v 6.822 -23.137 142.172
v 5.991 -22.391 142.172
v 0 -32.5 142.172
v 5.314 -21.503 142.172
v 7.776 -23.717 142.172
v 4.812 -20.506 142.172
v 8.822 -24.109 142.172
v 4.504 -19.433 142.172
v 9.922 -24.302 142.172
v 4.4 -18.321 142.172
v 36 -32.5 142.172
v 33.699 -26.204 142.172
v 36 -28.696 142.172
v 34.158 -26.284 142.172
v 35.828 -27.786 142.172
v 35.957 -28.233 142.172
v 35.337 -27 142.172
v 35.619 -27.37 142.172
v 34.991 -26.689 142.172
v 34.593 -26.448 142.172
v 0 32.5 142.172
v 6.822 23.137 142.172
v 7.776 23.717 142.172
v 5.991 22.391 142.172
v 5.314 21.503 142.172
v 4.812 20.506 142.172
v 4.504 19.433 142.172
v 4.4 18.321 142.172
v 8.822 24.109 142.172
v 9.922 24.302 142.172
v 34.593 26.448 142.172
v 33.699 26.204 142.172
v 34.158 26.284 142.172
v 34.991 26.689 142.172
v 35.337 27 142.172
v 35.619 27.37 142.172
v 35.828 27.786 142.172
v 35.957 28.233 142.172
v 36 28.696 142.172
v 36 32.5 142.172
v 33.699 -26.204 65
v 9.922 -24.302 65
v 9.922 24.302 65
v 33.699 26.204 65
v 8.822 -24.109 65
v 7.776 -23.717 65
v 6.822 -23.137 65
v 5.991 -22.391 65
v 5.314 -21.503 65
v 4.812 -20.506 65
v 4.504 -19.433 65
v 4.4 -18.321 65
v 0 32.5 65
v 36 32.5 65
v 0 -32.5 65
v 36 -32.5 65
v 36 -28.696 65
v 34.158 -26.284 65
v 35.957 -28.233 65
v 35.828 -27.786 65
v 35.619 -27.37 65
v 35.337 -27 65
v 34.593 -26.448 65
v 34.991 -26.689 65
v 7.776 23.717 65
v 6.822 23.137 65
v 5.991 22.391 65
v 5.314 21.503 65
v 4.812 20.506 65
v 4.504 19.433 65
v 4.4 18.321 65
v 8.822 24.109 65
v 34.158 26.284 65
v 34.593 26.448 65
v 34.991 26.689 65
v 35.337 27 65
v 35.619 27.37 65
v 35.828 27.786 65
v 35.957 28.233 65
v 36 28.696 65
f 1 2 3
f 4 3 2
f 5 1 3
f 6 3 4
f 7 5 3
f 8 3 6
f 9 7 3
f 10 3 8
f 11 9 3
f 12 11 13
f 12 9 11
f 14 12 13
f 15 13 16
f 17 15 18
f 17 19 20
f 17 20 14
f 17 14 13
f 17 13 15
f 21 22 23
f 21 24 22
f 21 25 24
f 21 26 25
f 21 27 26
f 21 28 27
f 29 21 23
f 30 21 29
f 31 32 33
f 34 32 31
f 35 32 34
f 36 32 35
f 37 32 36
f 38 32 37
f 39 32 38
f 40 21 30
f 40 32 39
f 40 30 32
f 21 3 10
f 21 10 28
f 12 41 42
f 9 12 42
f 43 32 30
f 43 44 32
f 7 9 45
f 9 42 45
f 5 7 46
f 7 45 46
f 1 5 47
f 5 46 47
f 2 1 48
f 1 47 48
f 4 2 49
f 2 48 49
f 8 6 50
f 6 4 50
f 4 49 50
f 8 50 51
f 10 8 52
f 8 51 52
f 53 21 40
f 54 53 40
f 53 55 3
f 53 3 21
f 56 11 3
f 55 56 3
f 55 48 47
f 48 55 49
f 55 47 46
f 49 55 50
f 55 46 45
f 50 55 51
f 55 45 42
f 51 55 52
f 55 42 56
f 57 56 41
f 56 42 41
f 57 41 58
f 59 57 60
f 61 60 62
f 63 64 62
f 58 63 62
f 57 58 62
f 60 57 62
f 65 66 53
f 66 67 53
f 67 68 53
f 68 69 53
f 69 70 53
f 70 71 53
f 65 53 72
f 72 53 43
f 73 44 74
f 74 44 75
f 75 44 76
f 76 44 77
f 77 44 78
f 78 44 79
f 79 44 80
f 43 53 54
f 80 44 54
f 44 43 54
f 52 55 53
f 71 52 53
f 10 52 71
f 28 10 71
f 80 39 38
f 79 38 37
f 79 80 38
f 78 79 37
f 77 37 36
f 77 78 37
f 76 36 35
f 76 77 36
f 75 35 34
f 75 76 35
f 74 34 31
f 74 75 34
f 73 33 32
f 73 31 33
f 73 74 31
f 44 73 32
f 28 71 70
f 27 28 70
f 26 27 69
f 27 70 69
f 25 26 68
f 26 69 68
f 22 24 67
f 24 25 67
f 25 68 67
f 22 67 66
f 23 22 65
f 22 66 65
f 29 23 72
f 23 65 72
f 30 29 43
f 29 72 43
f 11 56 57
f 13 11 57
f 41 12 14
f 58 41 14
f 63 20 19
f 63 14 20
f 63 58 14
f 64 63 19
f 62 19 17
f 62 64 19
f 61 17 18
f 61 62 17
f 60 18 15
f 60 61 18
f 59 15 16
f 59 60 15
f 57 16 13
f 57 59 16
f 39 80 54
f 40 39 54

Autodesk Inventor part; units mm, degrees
ref_plane "Начальная плоскость" through (0, 0, 65) normal (0, 0, 1) x (1, 0, 0)
ref_plane "Конечная плоскость" through (0, 0, 142.172) normal (0, 0, 1) x (1, 0, 0)
sketch "Эскиз" plane through (0, 0, 0) normal (0, 0, 1) x (1, 0, 0)
  line L0 (36, -32.5) -> (0, -32.5)
  line L1 (36, -32.5) -> (36, -28.696)
  line L2 (33.6994, -26.2039) -> (9.9215, -24.3017)
  line L3 (4.4, -18.3208) -> (4.4, 18.3208)
  line L4 (33.6994, 26.2039) -> (9.9215, 24.3017)
  line L5 (36, 28.696) -> (36, 32.5)
  line L6 (0, 32.5) -> (36, 32.5)
  line L7 (0, -32.5) -> (0, 32.5)
  arc A0 (4.4, -18.3208) -> (9.9215, -24.3017) centre (10.4, -18.3208) ccw
  arc A1 (9.9215, 24.3017) -> (4.4, 18.3208) centre (10.4, 18.3208) ccw
  arc A2 (36, -28.696) -> (33.6994, -26.2039) centre (33.5, -28.696) ccw
  arc A3 (33.6994, 26.2039) -> (36, 28.696) centre (33.5, 28.696) ccw
  line L8 (0, 45.5) -> (0, -45.5) construction
  line L9 (-7.2974, 0) -> (43.7847, 0) construction
  point P0 (36, -26.388)
  point P1 (4.4, -23.86)
  point P2 (4.4, 23.86)
  point P3 (36, 26.388)
  dimension "d3" = 36
  dimension "d5" = 4.4
  dimension "d7" = 65
  dimension "d9" = 8.64
  dimension "d11" = 8.64
  dimension "d13" = 6.112
  dimension "d15" = 6.112
  dimension "d22" = 6
  dimension "d23" = 2.5
  dimension "d24" = 32.5
  dimension "d25" = 0
extrude "Тело" add sketch "Эскиз" along normal up to surface (77.172 mm away) from surface at 65
sketch "Sketch3" plane through (0, 0, 0) normal (0, 0, 1) x (1, 0, 0)
  line L0 (0, 0) -> (10, 0)
ref_plane "Work Plane7" through (0, 0, 0) normal (0, -1, 0) x (1, 0, 0)
sketch "Sketch4" plane through (0, 0, 0) normal (0, -1, 0) x (1, 0, 0)
  line L0 (-2, 65) -> (12, 65)
  line L1 (-2, 142.172) -> (12, 142.172)
  dimension "d29" = 77.172
ref_plane "РабПлоскость8" through (0, -398.2295, 142.172) normal (0, 0, 1) x (1, 0, 0)
split "Разделение1" plane through (0, -398.2295, 142.172) removes the side toward (0, 0, 1)
ref_plane "РабПлоскость9" through (36, -398.2295, 65) normal (0, 0, -1) x (-1, 0, 0)
split "Разделение2" plane through (36, -398.2295, 65) removes the side toward (0, 0, -1)
equation "\"d3\" = b"
equation "\"d5\" = t1"
equation "\"d7\" = ParH"
equation "\"d9\" = msp_x1 + t2"
equation "\"d11\" = msp_x1 + t2"
equation "\"d13\" = -msp_x2 + t2"
equation "\"d15\" = -msp_x2 + t2"
equation "\"d22\" = R"
equation "\"d23\" = R1"
equation "\"d24\" = 0.5 * d7"
equation "\"d16\" = G_L"
equation "\"R1\" = 2.5"
equation "\"R\" = 6"
equation "\"t1\" = 4.4"
equation "\"t2\" = 7.2"
equation "\"ParH\" = 65"
equation "\"b\" = 36"
equation "\"msp_x1\" = 0.04 * b"
equation "\"msp_x2\" = -0.08 * t1 + 0.04 * b"
equation "\"G_L\" = d29"
equation "\"ex\" = 0"
equation "\"G_OFFSET_START\" = -65"
equation "\"G_OFFSET_END\" = -65"
equation "\"d26\" = -G_OFFSET_START"
equation "\"d27\" = G_OFFSET_END + B_L"
equation "\"B_L\" = 207.172"
properties part number "Швеллер 6.5U-77,17 ГОСТ 8240-97" material "Сталь, мягкая"
